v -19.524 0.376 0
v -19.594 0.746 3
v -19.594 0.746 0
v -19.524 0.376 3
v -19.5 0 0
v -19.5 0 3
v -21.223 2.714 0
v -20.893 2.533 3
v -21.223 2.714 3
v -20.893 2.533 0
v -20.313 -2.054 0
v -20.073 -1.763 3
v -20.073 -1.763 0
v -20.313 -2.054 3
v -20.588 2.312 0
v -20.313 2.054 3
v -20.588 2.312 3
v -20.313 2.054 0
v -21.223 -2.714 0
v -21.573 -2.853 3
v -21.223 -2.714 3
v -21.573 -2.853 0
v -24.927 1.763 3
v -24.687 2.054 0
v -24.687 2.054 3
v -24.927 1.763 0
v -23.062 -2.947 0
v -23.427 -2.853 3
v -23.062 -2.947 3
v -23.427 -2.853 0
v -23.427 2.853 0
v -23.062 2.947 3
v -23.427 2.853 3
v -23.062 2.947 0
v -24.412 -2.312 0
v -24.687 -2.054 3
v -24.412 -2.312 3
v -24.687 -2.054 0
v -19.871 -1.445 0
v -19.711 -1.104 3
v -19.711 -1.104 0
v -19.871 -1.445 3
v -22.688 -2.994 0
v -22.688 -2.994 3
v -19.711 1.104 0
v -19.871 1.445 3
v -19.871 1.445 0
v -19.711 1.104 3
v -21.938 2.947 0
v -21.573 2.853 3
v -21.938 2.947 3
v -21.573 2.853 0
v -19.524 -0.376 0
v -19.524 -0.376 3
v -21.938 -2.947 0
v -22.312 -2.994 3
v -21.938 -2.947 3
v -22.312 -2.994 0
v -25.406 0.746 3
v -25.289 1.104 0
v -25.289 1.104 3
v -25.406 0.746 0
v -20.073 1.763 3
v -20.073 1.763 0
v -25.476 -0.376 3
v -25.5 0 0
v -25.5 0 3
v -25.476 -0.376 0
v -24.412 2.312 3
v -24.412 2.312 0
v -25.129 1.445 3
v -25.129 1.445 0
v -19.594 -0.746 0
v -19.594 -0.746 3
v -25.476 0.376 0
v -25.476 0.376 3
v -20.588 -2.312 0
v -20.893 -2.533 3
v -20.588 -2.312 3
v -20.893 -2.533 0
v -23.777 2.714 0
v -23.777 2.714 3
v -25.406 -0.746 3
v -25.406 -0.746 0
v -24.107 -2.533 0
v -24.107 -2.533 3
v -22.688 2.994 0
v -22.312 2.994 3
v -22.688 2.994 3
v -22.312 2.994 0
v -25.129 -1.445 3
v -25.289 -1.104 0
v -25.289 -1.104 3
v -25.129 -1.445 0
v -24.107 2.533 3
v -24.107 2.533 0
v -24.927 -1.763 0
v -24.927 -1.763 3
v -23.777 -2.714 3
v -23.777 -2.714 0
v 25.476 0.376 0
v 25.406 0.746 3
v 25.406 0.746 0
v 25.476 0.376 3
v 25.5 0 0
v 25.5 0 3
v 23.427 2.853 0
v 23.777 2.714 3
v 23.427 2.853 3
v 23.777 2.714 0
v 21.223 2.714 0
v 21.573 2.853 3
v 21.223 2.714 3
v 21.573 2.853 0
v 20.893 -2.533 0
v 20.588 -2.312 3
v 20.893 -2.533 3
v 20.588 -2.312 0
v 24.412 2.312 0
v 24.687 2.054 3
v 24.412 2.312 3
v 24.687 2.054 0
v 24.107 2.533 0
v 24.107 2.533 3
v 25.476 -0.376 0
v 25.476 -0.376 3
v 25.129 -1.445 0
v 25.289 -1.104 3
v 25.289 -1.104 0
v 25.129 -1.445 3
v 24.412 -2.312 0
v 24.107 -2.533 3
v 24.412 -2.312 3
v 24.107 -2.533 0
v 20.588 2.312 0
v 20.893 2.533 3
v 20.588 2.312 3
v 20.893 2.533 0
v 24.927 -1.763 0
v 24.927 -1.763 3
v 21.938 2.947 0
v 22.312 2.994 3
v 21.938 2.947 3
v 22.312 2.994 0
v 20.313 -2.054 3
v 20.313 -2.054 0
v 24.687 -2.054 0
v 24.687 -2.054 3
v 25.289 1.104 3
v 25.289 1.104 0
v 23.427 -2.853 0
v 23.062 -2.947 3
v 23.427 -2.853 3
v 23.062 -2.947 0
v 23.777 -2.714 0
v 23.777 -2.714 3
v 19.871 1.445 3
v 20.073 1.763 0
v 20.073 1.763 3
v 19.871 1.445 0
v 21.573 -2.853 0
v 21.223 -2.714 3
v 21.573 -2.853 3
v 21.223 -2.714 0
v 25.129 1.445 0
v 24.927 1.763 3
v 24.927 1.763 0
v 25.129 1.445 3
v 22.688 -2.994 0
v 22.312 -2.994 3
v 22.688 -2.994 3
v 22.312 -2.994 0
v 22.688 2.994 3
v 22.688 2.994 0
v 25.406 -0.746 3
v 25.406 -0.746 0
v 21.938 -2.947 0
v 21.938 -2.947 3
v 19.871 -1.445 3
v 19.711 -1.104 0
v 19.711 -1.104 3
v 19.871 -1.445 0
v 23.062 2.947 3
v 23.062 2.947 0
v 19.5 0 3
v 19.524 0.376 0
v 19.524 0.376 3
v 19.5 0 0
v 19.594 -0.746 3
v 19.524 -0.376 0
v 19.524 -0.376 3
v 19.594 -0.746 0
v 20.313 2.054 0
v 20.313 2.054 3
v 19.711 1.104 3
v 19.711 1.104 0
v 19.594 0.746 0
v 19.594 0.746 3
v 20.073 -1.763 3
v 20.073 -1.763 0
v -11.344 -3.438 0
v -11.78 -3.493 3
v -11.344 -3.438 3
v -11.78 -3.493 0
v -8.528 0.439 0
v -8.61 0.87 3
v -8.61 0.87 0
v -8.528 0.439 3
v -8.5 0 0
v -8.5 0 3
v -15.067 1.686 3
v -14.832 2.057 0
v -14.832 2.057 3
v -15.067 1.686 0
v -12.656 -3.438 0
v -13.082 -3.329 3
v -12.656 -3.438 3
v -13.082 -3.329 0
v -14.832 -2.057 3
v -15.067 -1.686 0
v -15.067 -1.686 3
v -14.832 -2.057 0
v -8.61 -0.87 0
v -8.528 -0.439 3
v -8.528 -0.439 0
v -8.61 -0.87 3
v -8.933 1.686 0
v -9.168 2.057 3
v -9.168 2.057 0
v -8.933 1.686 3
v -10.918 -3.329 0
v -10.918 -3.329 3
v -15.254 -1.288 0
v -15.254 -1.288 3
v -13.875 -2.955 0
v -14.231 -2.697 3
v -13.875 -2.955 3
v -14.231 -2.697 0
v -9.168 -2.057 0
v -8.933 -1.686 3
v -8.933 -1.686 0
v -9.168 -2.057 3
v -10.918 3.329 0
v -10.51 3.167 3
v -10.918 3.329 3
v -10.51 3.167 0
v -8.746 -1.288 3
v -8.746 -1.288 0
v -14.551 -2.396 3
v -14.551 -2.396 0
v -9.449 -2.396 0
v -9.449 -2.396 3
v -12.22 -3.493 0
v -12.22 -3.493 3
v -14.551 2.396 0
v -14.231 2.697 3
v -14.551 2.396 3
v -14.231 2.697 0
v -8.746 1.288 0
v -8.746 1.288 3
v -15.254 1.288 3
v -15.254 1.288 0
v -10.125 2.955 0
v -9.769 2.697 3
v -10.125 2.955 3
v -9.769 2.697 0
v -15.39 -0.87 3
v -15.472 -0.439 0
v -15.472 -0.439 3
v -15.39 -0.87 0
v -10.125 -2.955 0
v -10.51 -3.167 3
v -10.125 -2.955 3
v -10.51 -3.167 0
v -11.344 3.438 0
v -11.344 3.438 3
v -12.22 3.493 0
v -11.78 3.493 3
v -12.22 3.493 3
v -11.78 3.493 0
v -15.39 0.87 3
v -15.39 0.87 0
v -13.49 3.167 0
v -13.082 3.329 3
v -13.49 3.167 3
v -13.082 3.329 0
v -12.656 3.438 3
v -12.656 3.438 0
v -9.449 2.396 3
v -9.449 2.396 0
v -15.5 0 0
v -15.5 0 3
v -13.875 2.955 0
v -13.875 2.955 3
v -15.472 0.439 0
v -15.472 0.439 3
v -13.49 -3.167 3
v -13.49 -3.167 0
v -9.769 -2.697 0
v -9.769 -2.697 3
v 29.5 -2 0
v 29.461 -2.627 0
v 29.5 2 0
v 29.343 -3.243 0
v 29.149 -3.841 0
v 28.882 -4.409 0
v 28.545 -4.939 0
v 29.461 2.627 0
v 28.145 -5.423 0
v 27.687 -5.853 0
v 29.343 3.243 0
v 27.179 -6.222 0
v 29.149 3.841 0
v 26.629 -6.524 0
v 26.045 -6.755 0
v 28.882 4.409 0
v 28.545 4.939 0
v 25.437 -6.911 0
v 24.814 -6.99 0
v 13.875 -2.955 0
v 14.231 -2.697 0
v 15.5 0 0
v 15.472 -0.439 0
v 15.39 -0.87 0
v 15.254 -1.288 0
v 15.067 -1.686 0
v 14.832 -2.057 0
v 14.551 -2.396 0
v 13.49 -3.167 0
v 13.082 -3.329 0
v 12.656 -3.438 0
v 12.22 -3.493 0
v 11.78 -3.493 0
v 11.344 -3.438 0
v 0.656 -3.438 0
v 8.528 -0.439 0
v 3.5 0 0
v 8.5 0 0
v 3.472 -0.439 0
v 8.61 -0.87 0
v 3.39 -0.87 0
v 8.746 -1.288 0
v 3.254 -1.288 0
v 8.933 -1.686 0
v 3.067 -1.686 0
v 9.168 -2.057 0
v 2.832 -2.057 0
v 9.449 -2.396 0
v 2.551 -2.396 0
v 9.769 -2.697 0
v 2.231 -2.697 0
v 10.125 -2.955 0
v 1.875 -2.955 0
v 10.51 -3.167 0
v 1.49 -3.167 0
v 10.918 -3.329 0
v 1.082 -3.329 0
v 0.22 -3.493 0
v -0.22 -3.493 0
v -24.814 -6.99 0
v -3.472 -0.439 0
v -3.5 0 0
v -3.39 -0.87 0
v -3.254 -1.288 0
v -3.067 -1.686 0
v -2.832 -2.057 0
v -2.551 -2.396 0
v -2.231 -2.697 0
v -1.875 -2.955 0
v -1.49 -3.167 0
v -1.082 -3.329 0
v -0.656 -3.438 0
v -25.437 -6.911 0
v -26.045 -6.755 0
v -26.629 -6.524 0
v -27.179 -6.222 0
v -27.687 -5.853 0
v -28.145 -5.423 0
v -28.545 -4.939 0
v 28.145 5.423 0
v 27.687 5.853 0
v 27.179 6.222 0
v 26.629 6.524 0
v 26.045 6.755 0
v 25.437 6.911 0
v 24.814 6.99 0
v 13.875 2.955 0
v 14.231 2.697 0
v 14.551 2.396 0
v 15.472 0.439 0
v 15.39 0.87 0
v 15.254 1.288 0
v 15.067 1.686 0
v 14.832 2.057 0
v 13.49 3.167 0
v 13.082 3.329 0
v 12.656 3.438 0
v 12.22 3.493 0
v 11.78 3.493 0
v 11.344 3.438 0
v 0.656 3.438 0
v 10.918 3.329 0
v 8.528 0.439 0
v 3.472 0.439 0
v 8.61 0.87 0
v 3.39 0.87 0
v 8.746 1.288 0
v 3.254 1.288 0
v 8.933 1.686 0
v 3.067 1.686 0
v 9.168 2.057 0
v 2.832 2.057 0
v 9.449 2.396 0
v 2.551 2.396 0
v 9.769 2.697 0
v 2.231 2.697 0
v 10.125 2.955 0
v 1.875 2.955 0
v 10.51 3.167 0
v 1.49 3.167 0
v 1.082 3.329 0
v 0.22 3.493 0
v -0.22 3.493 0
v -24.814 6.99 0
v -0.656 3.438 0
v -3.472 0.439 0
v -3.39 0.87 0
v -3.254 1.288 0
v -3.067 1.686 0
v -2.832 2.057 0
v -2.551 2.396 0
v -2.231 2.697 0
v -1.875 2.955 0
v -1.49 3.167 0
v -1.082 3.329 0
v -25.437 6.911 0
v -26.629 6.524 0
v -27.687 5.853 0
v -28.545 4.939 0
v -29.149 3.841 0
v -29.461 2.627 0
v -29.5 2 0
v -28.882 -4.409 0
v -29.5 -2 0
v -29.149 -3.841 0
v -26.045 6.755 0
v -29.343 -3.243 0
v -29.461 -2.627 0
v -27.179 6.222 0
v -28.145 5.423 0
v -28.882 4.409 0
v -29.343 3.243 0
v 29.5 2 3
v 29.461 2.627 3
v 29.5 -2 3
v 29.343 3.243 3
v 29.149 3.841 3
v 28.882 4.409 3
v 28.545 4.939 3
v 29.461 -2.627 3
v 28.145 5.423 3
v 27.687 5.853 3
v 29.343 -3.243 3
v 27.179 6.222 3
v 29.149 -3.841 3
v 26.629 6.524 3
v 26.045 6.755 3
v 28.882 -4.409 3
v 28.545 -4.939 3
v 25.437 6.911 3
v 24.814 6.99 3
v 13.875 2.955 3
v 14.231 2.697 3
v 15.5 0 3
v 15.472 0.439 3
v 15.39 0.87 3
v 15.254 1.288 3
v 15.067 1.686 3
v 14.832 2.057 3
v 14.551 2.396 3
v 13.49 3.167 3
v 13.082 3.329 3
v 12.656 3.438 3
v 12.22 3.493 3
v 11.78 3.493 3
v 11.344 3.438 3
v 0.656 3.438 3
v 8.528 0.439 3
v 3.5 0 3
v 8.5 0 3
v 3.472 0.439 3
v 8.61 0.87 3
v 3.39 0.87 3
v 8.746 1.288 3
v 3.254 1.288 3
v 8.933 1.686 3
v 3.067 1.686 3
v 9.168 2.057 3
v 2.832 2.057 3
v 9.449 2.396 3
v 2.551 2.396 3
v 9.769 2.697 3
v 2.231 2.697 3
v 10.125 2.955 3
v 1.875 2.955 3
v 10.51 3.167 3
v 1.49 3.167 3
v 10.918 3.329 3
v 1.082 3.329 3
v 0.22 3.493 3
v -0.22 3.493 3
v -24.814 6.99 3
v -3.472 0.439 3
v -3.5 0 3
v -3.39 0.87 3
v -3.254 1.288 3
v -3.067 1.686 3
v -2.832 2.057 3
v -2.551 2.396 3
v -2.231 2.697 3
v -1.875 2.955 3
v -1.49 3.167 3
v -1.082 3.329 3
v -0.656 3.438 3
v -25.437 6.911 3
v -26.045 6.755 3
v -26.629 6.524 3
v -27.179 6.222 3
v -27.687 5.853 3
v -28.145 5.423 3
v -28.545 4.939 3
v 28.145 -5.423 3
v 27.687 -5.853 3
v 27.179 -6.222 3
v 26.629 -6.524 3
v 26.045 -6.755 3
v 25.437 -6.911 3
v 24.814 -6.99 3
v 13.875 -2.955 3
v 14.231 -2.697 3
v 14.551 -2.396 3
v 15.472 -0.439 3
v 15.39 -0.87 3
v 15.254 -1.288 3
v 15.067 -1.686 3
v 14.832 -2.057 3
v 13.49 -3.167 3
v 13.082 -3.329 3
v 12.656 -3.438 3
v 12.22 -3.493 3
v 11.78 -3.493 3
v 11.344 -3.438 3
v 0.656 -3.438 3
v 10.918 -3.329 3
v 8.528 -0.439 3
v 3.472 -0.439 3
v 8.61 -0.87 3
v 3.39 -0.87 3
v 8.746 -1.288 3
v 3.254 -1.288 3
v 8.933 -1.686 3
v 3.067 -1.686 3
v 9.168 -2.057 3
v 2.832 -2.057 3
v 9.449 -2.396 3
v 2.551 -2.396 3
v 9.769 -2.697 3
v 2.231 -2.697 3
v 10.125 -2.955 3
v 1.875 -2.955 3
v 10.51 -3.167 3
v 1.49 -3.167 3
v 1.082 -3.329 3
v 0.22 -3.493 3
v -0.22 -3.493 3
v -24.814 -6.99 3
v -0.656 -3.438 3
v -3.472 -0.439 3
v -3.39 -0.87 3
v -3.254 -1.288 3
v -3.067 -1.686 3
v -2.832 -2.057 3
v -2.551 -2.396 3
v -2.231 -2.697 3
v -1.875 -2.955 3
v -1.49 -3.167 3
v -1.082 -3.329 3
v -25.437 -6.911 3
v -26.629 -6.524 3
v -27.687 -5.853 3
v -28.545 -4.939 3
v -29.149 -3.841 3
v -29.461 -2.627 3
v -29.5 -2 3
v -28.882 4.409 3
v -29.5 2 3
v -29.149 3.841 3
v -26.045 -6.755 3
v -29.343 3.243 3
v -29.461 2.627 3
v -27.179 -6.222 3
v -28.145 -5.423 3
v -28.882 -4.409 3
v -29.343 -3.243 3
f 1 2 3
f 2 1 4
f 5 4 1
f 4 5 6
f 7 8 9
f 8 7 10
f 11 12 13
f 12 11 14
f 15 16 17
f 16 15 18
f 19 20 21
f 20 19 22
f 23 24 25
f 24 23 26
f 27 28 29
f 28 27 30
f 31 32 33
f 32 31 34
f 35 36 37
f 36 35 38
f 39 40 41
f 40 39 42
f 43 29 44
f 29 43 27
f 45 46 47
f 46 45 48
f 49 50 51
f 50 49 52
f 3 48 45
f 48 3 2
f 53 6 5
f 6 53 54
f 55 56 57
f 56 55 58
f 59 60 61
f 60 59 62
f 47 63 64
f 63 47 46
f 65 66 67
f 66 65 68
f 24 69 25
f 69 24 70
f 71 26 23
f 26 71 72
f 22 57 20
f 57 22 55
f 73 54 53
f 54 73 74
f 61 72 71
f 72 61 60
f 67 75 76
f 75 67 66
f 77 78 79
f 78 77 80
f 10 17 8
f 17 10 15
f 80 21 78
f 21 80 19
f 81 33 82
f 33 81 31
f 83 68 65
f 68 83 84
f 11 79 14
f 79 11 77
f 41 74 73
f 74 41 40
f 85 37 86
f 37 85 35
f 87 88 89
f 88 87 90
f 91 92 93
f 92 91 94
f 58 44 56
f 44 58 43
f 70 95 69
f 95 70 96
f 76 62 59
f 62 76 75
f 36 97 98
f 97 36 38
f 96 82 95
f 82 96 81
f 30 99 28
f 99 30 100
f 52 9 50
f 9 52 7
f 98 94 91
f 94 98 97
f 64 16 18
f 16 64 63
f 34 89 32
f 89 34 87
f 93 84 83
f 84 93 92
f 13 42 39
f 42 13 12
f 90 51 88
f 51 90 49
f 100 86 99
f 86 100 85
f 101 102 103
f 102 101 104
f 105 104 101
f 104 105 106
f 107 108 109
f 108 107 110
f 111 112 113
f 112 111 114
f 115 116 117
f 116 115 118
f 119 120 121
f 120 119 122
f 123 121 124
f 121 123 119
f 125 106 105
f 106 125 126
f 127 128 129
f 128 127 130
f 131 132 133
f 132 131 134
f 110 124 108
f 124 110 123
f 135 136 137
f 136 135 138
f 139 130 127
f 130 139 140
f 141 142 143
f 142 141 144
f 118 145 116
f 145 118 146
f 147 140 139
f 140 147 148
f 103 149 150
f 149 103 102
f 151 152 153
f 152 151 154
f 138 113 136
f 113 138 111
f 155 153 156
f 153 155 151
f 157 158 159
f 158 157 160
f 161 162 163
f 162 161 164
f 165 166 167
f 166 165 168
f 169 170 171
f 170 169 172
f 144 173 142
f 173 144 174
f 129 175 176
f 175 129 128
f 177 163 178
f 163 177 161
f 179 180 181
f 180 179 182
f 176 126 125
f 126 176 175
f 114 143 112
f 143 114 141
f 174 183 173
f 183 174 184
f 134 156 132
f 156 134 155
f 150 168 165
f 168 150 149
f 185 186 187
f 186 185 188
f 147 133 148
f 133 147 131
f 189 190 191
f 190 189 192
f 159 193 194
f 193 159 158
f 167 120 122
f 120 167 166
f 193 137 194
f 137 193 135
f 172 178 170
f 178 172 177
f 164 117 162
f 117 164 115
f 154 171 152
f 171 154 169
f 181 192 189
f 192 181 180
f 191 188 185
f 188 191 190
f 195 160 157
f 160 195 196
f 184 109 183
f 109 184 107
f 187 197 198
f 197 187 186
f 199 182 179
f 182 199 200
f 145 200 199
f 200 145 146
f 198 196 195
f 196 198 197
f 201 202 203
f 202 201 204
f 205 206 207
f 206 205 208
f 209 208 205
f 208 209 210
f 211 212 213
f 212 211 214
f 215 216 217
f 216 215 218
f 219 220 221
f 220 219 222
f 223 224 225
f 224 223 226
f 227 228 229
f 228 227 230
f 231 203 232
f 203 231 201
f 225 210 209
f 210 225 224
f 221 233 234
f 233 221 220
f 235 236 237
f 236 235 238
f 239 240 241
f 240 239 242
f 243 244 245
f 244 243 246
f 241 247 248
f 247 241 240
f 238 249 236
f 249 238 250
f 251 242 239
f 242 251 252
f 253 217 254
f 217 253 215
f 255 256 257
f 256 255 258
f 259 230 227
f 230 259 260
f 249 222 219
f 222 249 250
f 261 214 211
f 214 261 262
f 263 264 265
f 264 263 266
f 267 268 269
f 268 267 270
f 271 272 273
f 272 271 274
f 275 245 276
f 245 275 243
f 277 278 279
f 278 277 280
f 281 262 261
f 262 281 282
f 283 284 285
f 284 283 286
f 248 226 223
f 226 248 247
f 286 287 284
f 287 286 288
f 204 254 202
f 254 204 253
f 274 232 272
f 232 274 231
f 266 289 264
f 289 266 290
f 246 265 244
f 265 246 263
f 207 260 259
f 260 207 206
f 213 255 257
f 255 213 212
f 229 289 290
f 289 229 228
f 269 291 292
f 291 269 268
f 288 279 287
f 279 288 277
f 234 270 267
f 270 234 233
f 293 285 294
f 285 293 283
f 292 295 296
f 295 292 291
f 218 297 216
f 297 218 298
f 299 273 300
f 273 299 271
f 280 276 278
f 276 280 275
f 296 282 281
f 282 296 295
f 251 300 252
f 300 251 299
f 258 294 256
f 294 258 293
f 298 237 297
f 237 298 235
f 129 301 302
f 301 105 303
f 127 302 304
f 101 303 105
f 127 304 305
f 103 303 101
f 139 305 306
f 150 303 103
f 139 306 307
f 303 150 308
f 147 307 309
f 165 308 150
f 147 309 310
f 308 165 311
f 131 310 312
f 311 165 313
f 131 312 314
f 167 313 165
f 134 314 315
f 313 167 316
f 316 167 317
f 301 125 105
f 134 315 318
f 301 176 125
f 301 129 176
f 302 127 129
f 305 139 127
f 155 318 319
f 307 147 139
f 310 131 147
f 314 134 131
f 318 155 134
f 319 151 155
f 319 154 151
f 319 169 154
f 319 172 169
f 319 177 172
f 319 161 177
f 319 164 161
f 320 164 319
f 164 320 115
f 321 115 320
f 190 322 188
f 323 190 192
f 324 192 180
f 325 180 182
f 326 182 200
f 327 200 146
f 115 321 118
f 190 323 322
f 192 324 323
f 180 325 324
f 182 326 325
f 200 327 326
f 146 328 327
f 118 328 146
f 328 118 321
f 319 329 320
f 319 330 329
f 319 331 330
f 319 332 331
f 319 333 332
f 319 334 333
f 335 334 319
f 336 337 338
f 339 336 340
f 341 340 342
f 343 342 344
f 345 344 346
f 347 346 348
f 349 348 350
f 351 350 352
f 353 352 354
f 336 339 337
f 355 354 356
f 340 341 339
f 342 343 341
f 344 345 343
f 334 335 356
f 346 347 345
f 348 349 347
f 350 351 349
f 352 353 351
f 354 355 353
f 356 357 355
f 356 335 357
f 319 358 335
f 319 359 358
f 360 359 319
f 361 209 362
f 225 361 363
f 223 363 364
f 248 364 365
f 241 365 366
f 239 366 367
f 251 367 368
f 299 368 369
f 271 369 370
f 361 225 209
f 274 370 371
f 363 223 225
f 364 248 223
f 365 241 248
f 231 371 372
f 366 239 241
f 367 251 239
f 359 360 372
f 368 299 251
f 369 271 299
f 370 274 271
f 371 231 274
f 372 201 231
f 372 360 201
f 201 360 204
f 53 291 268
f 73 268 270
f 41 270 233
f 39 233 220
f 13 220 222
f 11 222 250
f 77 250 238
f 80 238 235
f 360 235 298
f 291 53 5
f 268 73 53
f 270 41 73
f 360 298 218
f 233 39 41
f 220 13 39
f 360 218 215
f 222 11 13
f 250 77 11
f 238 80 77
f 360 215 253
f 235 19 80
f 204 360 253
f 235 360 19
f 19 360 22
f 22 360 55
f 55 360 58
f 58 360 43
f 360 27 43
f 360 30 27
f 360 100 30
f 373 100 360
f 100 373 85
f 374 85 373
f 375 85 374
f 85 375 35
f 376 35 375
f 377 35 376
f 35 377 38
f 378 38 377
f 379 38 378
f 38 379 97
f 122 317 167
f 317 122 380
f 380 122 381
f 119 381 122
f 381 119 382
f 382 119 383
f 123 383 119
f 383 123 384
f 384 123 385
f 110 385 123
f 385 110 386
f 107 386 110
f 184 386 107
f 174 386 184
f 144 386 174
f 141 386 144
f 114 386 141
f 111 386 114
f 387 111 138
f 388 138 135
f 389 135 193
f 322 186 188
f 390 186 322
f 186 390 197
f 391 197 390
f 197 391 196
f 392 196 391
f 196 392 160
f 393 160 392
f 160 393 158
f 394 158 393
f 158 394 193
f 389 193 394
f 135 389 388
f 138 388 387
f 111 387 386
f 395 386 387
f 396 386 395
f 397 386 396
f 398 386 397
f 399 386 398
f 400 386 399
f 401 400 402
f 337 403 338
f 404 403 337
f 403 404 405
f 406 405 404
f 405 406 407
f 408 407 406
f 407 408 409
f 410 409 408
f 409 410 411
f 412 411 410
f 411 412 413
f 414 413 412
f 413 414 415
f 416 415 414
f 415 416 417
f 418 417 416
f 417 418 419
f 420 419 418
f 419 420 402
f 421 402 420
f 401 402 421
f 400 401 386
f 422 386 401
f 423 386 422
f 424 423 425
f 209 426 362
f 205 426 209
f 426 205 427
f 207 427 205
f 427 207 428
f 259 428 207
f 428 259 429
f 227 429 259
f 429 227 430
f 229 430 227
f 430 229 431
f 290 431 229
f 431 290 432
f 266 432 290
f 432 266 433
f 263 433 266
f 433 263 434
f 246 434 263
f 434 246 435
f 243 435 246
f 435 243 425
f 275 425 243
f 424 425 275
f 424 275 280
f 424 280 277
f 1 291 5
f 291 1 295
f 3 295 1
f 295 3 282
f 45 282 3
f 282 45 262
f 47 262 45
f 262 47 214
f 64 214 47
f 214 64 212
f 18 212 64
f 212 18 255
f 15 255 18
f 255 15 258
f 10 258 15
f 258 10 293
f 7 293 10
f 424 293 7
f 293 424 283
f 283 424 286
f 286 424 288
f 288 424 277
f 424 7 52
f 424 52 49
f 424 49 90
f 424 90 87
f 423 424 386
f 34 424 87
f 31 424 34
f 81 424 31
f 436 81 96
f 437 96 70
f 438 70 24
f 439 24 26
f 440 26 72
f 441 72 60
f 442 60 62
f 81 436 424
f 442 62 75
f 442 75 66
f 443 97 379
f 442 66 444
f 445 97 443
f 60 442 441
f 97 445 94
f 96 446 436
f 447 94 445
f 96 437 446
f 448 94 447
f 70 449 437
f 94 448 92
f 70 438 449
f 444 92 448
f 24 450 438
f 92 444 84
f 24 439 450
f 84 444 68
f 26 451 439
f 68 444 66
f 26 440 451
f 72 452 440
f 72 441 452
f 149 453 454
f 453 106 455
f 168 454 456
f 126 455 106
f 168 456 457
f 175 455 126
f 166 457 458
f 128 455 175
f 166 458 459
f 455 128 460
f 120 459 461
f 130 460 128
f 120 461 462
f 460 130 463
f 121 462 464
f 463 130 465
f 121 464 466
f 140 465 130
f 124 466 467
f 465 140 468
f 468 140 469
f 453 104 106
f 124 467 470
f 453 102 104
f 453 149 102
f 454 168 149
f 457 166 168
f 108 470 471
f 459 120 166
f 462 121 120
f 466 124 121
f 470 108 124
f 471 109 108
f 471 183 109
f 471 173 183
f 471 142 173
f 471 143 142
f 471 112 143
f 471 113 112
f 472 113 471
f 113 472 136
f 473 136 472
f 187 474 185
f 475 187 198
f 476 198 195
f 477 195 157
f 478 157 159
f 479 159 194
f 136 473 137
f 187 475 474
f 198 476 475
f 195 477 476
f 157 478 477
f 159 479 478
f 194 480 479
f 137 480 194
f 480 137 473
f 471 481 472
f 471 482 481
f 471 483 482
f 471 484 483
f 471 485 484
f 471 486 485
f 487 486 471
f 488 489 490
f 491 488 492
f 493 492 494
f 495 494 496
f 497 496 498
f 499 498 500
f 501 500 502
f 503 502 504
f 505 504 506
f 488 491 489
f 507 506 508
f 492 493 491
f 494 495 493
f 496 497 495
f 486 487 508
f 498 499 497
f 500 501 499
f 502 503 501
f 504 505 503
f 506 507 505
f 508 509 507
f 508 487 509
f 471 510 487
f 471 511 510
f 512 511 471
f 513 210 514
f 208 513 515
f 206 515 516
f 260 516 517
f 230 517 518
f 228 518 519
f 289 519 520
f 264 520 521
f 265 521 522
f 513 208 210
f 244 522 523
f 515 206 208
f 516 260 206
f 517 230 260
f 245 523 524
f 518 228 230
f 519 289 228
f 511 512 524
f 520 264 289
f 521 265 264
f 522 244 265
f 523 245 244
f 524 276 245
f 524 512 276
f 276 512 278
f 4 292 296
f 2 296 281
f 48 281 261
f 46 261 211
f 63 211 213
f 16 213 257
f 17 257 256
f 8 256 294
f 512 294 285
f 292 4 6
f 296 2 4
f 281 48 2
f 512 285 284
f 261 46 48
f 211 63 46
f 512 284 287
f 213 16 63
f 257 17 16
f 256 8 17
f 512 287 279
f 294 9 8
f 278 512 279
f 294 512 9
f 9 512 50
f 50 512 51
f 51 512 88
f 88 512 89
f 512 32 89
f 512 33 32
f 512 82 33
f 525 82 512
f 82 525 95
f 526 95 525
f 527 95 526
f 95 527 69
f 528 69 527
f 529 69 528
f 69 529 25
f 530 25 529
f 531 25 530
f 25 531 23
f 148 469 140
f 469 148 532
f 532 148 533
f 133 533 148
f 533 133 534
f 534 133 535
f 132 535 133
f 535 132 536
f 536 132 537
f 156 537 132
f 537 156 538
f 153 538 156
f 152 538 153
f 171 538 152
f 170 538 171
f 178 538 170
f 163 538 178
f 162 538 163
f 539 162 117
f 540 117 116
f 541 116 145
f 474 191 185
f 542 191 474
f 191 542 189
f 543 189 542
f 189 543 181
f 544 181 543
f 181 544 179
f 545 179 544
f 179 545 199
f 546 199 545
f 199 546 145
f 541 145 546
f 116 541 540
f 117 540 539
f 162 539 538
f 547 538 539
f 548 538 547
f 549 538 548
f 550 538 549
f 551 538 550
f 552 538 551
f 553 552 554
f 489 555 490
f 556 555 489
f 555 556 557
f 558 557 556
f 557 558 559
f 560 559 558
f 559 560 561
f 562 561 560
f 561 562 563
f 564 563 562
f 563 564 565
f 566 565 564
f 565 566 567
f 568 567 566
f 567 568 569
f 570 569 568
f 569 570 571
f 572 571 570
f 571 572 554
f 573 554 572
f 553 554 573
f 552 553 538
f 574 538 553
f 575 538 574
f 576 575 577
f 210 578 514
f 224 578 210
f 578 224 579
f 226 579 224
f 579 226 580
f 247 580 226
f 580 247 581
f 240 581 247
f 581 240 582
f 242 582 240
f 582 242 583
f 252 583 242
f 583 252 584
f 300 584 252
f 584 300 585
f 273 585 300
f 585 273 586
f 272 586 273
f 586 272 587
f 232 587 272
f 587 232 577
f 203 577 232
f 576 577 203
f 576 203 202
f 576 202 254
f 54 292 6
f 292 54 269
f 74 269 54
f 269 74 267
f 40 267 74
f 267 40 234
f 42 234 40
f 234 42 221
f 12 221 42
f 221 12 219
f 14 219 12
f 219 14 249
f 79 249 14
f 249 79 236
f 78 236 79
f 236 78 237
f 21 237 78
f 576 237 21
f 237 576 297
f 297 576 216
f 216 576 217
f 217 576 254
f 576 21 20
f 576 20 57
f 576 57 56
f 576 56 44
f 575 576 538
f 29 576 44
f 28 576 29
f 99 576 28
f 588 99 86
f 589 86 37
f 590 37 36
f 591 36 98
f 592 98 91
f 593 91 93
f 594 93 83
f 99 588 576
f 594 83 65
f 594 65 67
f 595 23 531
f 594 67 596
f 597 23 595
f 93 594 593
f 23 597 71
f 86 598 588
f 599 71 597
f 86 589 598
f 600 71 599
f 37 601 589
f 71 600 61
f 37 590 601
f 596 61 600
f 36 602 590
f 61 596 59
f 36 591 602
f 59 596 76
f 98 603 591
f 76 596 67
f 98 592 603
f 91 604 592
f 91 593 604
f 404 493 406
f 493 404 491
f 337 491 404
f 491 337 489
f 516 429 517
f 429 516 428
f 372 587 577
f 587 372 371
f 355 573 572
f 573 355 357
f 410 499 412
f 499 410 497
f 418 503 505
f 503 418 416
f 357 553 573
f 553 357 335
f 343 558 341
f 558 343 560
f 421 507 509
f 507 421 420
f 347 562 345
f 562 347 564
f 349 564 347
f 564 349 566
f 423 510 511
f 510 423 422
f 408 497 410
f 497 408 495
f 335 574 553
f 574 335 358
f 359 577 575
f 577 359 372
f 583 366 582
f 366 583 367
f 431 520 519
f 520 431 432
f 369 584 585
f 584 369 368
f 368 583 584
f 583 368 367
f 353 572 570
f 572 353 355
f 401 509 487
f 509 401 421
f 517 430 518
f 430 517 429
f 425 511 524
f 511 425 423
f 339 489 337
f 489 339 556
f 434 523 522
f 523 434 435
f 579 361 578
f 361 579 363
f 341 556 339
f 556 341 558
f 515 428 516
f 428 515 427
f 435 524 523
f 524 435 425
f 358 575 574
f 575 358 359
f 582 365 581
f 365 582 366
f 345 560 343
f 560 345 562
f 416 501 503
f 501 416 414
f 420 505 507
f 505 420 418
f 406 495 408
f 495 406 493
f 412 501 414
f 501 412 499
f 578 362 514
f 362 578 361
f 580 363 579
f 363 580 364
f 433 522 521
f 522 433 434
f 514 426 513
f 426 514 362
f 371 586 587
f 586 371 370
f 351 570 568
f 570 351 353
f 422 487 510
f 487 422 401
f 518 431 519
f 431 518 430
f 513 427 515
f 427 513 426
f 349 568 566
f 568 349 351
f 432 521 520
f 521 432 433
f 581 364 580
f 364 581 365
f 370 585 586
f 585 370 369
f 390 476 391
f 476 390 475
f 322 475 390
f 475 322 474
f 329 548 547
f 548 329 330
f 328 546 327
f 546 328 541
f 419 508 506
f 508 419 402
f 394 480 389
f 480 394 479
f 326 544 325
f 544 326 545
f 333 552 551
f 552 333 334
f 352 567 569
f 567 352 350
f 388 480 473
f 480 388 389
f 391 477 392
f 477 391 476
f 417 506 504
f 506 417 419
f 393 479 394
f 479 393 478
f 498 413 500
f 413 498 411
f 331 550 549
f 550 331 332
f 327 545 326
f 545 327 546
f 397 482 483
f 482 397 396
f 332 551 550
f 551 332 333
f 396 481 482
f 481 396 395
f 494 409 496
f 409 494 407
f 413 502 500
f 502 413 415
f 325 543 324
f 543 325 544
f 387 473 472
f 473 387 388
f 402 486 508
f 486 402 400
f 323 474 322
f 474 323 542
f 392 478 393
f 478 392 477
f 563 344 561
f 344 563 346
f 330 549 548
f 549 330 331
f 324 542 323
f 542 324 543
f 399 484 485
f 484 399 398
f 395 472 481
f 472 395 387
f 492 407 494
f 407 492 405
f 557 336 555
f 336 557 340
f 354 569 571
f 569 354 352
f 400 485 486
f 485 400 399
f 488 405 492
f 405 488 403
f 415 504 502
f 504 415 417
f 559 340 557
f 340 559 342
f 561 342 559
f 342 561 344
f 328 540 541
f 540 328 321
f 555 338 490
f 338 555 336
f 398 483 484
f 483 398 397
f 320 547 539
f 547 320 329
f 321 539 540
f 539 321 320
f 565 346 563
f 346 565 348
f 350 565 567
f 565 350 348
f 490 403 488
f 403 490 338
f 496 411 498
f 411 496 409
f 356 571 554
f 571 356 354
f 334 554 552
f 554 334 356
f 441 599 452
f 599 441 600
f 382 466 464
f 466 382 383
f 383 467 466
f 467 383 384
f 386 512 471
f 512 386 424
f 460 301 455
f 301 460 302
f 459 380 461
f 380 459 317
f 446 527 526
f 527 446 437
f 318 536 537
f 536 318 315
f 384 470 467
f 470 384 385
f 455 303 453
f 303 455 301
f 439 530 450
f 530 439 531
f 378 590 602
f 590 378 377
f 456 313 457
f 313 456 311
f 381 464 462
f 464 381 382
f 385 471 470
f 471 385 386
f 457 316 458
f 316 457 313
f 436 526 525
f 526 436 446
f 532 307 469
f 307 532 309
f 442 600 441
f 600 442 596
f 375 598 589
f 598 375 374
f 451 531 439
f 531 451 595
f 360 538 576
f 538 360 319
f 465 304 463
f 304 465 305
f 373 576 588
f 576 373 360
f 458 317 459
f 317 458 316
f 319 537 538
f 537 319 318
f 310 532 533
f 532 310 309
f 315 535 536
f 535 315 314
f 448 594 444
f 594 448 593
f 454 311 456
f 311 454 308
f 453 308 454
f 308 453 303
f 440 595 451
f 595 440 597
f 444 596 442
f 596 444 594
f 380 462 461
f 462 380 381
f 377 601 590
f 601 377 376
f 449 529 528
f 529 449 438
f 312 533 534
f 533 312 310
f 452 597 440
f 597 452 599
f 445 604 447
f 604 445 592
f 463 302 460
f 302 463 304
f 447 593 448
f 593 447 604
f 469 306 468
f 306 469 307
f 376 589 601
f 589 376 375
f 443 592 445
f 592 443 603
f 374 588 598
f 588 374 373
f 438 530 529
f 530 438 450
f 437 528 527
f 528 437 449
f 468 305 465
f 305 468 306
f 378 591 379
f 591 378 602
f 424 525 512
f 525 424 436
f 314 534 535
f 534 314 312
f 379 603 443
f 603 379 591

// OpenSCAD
$fn = 50;


difference() {
	union() {
		hull() {
			translate(v = [-24.5000000000, 2.0000000000, 0]) {
				cylinder(h = 3, r = 5);
			}
			translate(v = [24.5000000000, 2.0000000000, 0]) {
				cylinder(h = 3, r = 5);
			}
			translate(v = [-24.5000000000, -2.0000000000, 0]) {
				cylinder(h = 3, r = 5);
			}
			translate(v = [24.5000000000, -2.0000000000, 0]) {
				cylinder(h = 3, r = 5);
			}
		}
	}
	union() {
		#translate(v = [-22.5000000000, 0.0000000000, 0]) {
			cylinder(h = 3, r = 3.0000000000);
		}
		#translate(v = [22.5000000000, 0.0000000000, 0]) {
			cylinder(h = 3, r = 3.0000000000);
		}
		#translate(v = [-22.5000000000, 0.0000000000, -100.0000000000]) {
			cylinder(h = 200, r = 3.0000000000);
		}
		#translate(v = [-22.5000000000, 0.0000000000, -100.0000000000]) {
			cylinder(h = 200, r = 3.0000000000);
		}
		#translate(v = [22.5000000000, 0.0000000000, -100.0000000000]) {
			cylinder(h = 200, r = 3.0000000000);
		}
		#translate(v = [22.5000000000, 0.0000000000, -100.0000000000]) {
			cylinder(h = 200, r = 3.0000000000);
		}
		#translate(v = [-22.5000000000, 0.0000000000, 0]) {
			cylinder(h = 3, r = 1.5000000000);
		}
		#translate(v = [22.5000000000, 0.0000000000, 0]) {
			cylinder(h = 3, r = 1.5000000000);
		}
		#translate(v = [-22.5000000000, 0.0000000000, 0]) {
			cylinder(h = 3, r = 1.5000000000);
		}
		#translate(v = [22.5000000000, 0.0000000000, 0]) {
			cylinder(h = 3, r = 1.5000000000);
		}
		#translate(v = [-22.5000000000, 0.0000000000, 0]) {
			cylinder(h = 3, r = 1.5000000000);
		}
		#translate(v = [22.5000000000, 0.0000000000, 0]) {
			cylinder(h = 3, r = 1.5000000000);
		}
		#translate(v = [-12.0000000000, 0, 0]) {
			cylinder(h = 3, r = 3.5000000000);
		}
		#cylinder(h = 3, r = 3.5000000000);
		#translate(v = [12.0000000000, 0, 0]) {
			cylinder(h = 3, r = 3.5000000000);
		}
	}
}
